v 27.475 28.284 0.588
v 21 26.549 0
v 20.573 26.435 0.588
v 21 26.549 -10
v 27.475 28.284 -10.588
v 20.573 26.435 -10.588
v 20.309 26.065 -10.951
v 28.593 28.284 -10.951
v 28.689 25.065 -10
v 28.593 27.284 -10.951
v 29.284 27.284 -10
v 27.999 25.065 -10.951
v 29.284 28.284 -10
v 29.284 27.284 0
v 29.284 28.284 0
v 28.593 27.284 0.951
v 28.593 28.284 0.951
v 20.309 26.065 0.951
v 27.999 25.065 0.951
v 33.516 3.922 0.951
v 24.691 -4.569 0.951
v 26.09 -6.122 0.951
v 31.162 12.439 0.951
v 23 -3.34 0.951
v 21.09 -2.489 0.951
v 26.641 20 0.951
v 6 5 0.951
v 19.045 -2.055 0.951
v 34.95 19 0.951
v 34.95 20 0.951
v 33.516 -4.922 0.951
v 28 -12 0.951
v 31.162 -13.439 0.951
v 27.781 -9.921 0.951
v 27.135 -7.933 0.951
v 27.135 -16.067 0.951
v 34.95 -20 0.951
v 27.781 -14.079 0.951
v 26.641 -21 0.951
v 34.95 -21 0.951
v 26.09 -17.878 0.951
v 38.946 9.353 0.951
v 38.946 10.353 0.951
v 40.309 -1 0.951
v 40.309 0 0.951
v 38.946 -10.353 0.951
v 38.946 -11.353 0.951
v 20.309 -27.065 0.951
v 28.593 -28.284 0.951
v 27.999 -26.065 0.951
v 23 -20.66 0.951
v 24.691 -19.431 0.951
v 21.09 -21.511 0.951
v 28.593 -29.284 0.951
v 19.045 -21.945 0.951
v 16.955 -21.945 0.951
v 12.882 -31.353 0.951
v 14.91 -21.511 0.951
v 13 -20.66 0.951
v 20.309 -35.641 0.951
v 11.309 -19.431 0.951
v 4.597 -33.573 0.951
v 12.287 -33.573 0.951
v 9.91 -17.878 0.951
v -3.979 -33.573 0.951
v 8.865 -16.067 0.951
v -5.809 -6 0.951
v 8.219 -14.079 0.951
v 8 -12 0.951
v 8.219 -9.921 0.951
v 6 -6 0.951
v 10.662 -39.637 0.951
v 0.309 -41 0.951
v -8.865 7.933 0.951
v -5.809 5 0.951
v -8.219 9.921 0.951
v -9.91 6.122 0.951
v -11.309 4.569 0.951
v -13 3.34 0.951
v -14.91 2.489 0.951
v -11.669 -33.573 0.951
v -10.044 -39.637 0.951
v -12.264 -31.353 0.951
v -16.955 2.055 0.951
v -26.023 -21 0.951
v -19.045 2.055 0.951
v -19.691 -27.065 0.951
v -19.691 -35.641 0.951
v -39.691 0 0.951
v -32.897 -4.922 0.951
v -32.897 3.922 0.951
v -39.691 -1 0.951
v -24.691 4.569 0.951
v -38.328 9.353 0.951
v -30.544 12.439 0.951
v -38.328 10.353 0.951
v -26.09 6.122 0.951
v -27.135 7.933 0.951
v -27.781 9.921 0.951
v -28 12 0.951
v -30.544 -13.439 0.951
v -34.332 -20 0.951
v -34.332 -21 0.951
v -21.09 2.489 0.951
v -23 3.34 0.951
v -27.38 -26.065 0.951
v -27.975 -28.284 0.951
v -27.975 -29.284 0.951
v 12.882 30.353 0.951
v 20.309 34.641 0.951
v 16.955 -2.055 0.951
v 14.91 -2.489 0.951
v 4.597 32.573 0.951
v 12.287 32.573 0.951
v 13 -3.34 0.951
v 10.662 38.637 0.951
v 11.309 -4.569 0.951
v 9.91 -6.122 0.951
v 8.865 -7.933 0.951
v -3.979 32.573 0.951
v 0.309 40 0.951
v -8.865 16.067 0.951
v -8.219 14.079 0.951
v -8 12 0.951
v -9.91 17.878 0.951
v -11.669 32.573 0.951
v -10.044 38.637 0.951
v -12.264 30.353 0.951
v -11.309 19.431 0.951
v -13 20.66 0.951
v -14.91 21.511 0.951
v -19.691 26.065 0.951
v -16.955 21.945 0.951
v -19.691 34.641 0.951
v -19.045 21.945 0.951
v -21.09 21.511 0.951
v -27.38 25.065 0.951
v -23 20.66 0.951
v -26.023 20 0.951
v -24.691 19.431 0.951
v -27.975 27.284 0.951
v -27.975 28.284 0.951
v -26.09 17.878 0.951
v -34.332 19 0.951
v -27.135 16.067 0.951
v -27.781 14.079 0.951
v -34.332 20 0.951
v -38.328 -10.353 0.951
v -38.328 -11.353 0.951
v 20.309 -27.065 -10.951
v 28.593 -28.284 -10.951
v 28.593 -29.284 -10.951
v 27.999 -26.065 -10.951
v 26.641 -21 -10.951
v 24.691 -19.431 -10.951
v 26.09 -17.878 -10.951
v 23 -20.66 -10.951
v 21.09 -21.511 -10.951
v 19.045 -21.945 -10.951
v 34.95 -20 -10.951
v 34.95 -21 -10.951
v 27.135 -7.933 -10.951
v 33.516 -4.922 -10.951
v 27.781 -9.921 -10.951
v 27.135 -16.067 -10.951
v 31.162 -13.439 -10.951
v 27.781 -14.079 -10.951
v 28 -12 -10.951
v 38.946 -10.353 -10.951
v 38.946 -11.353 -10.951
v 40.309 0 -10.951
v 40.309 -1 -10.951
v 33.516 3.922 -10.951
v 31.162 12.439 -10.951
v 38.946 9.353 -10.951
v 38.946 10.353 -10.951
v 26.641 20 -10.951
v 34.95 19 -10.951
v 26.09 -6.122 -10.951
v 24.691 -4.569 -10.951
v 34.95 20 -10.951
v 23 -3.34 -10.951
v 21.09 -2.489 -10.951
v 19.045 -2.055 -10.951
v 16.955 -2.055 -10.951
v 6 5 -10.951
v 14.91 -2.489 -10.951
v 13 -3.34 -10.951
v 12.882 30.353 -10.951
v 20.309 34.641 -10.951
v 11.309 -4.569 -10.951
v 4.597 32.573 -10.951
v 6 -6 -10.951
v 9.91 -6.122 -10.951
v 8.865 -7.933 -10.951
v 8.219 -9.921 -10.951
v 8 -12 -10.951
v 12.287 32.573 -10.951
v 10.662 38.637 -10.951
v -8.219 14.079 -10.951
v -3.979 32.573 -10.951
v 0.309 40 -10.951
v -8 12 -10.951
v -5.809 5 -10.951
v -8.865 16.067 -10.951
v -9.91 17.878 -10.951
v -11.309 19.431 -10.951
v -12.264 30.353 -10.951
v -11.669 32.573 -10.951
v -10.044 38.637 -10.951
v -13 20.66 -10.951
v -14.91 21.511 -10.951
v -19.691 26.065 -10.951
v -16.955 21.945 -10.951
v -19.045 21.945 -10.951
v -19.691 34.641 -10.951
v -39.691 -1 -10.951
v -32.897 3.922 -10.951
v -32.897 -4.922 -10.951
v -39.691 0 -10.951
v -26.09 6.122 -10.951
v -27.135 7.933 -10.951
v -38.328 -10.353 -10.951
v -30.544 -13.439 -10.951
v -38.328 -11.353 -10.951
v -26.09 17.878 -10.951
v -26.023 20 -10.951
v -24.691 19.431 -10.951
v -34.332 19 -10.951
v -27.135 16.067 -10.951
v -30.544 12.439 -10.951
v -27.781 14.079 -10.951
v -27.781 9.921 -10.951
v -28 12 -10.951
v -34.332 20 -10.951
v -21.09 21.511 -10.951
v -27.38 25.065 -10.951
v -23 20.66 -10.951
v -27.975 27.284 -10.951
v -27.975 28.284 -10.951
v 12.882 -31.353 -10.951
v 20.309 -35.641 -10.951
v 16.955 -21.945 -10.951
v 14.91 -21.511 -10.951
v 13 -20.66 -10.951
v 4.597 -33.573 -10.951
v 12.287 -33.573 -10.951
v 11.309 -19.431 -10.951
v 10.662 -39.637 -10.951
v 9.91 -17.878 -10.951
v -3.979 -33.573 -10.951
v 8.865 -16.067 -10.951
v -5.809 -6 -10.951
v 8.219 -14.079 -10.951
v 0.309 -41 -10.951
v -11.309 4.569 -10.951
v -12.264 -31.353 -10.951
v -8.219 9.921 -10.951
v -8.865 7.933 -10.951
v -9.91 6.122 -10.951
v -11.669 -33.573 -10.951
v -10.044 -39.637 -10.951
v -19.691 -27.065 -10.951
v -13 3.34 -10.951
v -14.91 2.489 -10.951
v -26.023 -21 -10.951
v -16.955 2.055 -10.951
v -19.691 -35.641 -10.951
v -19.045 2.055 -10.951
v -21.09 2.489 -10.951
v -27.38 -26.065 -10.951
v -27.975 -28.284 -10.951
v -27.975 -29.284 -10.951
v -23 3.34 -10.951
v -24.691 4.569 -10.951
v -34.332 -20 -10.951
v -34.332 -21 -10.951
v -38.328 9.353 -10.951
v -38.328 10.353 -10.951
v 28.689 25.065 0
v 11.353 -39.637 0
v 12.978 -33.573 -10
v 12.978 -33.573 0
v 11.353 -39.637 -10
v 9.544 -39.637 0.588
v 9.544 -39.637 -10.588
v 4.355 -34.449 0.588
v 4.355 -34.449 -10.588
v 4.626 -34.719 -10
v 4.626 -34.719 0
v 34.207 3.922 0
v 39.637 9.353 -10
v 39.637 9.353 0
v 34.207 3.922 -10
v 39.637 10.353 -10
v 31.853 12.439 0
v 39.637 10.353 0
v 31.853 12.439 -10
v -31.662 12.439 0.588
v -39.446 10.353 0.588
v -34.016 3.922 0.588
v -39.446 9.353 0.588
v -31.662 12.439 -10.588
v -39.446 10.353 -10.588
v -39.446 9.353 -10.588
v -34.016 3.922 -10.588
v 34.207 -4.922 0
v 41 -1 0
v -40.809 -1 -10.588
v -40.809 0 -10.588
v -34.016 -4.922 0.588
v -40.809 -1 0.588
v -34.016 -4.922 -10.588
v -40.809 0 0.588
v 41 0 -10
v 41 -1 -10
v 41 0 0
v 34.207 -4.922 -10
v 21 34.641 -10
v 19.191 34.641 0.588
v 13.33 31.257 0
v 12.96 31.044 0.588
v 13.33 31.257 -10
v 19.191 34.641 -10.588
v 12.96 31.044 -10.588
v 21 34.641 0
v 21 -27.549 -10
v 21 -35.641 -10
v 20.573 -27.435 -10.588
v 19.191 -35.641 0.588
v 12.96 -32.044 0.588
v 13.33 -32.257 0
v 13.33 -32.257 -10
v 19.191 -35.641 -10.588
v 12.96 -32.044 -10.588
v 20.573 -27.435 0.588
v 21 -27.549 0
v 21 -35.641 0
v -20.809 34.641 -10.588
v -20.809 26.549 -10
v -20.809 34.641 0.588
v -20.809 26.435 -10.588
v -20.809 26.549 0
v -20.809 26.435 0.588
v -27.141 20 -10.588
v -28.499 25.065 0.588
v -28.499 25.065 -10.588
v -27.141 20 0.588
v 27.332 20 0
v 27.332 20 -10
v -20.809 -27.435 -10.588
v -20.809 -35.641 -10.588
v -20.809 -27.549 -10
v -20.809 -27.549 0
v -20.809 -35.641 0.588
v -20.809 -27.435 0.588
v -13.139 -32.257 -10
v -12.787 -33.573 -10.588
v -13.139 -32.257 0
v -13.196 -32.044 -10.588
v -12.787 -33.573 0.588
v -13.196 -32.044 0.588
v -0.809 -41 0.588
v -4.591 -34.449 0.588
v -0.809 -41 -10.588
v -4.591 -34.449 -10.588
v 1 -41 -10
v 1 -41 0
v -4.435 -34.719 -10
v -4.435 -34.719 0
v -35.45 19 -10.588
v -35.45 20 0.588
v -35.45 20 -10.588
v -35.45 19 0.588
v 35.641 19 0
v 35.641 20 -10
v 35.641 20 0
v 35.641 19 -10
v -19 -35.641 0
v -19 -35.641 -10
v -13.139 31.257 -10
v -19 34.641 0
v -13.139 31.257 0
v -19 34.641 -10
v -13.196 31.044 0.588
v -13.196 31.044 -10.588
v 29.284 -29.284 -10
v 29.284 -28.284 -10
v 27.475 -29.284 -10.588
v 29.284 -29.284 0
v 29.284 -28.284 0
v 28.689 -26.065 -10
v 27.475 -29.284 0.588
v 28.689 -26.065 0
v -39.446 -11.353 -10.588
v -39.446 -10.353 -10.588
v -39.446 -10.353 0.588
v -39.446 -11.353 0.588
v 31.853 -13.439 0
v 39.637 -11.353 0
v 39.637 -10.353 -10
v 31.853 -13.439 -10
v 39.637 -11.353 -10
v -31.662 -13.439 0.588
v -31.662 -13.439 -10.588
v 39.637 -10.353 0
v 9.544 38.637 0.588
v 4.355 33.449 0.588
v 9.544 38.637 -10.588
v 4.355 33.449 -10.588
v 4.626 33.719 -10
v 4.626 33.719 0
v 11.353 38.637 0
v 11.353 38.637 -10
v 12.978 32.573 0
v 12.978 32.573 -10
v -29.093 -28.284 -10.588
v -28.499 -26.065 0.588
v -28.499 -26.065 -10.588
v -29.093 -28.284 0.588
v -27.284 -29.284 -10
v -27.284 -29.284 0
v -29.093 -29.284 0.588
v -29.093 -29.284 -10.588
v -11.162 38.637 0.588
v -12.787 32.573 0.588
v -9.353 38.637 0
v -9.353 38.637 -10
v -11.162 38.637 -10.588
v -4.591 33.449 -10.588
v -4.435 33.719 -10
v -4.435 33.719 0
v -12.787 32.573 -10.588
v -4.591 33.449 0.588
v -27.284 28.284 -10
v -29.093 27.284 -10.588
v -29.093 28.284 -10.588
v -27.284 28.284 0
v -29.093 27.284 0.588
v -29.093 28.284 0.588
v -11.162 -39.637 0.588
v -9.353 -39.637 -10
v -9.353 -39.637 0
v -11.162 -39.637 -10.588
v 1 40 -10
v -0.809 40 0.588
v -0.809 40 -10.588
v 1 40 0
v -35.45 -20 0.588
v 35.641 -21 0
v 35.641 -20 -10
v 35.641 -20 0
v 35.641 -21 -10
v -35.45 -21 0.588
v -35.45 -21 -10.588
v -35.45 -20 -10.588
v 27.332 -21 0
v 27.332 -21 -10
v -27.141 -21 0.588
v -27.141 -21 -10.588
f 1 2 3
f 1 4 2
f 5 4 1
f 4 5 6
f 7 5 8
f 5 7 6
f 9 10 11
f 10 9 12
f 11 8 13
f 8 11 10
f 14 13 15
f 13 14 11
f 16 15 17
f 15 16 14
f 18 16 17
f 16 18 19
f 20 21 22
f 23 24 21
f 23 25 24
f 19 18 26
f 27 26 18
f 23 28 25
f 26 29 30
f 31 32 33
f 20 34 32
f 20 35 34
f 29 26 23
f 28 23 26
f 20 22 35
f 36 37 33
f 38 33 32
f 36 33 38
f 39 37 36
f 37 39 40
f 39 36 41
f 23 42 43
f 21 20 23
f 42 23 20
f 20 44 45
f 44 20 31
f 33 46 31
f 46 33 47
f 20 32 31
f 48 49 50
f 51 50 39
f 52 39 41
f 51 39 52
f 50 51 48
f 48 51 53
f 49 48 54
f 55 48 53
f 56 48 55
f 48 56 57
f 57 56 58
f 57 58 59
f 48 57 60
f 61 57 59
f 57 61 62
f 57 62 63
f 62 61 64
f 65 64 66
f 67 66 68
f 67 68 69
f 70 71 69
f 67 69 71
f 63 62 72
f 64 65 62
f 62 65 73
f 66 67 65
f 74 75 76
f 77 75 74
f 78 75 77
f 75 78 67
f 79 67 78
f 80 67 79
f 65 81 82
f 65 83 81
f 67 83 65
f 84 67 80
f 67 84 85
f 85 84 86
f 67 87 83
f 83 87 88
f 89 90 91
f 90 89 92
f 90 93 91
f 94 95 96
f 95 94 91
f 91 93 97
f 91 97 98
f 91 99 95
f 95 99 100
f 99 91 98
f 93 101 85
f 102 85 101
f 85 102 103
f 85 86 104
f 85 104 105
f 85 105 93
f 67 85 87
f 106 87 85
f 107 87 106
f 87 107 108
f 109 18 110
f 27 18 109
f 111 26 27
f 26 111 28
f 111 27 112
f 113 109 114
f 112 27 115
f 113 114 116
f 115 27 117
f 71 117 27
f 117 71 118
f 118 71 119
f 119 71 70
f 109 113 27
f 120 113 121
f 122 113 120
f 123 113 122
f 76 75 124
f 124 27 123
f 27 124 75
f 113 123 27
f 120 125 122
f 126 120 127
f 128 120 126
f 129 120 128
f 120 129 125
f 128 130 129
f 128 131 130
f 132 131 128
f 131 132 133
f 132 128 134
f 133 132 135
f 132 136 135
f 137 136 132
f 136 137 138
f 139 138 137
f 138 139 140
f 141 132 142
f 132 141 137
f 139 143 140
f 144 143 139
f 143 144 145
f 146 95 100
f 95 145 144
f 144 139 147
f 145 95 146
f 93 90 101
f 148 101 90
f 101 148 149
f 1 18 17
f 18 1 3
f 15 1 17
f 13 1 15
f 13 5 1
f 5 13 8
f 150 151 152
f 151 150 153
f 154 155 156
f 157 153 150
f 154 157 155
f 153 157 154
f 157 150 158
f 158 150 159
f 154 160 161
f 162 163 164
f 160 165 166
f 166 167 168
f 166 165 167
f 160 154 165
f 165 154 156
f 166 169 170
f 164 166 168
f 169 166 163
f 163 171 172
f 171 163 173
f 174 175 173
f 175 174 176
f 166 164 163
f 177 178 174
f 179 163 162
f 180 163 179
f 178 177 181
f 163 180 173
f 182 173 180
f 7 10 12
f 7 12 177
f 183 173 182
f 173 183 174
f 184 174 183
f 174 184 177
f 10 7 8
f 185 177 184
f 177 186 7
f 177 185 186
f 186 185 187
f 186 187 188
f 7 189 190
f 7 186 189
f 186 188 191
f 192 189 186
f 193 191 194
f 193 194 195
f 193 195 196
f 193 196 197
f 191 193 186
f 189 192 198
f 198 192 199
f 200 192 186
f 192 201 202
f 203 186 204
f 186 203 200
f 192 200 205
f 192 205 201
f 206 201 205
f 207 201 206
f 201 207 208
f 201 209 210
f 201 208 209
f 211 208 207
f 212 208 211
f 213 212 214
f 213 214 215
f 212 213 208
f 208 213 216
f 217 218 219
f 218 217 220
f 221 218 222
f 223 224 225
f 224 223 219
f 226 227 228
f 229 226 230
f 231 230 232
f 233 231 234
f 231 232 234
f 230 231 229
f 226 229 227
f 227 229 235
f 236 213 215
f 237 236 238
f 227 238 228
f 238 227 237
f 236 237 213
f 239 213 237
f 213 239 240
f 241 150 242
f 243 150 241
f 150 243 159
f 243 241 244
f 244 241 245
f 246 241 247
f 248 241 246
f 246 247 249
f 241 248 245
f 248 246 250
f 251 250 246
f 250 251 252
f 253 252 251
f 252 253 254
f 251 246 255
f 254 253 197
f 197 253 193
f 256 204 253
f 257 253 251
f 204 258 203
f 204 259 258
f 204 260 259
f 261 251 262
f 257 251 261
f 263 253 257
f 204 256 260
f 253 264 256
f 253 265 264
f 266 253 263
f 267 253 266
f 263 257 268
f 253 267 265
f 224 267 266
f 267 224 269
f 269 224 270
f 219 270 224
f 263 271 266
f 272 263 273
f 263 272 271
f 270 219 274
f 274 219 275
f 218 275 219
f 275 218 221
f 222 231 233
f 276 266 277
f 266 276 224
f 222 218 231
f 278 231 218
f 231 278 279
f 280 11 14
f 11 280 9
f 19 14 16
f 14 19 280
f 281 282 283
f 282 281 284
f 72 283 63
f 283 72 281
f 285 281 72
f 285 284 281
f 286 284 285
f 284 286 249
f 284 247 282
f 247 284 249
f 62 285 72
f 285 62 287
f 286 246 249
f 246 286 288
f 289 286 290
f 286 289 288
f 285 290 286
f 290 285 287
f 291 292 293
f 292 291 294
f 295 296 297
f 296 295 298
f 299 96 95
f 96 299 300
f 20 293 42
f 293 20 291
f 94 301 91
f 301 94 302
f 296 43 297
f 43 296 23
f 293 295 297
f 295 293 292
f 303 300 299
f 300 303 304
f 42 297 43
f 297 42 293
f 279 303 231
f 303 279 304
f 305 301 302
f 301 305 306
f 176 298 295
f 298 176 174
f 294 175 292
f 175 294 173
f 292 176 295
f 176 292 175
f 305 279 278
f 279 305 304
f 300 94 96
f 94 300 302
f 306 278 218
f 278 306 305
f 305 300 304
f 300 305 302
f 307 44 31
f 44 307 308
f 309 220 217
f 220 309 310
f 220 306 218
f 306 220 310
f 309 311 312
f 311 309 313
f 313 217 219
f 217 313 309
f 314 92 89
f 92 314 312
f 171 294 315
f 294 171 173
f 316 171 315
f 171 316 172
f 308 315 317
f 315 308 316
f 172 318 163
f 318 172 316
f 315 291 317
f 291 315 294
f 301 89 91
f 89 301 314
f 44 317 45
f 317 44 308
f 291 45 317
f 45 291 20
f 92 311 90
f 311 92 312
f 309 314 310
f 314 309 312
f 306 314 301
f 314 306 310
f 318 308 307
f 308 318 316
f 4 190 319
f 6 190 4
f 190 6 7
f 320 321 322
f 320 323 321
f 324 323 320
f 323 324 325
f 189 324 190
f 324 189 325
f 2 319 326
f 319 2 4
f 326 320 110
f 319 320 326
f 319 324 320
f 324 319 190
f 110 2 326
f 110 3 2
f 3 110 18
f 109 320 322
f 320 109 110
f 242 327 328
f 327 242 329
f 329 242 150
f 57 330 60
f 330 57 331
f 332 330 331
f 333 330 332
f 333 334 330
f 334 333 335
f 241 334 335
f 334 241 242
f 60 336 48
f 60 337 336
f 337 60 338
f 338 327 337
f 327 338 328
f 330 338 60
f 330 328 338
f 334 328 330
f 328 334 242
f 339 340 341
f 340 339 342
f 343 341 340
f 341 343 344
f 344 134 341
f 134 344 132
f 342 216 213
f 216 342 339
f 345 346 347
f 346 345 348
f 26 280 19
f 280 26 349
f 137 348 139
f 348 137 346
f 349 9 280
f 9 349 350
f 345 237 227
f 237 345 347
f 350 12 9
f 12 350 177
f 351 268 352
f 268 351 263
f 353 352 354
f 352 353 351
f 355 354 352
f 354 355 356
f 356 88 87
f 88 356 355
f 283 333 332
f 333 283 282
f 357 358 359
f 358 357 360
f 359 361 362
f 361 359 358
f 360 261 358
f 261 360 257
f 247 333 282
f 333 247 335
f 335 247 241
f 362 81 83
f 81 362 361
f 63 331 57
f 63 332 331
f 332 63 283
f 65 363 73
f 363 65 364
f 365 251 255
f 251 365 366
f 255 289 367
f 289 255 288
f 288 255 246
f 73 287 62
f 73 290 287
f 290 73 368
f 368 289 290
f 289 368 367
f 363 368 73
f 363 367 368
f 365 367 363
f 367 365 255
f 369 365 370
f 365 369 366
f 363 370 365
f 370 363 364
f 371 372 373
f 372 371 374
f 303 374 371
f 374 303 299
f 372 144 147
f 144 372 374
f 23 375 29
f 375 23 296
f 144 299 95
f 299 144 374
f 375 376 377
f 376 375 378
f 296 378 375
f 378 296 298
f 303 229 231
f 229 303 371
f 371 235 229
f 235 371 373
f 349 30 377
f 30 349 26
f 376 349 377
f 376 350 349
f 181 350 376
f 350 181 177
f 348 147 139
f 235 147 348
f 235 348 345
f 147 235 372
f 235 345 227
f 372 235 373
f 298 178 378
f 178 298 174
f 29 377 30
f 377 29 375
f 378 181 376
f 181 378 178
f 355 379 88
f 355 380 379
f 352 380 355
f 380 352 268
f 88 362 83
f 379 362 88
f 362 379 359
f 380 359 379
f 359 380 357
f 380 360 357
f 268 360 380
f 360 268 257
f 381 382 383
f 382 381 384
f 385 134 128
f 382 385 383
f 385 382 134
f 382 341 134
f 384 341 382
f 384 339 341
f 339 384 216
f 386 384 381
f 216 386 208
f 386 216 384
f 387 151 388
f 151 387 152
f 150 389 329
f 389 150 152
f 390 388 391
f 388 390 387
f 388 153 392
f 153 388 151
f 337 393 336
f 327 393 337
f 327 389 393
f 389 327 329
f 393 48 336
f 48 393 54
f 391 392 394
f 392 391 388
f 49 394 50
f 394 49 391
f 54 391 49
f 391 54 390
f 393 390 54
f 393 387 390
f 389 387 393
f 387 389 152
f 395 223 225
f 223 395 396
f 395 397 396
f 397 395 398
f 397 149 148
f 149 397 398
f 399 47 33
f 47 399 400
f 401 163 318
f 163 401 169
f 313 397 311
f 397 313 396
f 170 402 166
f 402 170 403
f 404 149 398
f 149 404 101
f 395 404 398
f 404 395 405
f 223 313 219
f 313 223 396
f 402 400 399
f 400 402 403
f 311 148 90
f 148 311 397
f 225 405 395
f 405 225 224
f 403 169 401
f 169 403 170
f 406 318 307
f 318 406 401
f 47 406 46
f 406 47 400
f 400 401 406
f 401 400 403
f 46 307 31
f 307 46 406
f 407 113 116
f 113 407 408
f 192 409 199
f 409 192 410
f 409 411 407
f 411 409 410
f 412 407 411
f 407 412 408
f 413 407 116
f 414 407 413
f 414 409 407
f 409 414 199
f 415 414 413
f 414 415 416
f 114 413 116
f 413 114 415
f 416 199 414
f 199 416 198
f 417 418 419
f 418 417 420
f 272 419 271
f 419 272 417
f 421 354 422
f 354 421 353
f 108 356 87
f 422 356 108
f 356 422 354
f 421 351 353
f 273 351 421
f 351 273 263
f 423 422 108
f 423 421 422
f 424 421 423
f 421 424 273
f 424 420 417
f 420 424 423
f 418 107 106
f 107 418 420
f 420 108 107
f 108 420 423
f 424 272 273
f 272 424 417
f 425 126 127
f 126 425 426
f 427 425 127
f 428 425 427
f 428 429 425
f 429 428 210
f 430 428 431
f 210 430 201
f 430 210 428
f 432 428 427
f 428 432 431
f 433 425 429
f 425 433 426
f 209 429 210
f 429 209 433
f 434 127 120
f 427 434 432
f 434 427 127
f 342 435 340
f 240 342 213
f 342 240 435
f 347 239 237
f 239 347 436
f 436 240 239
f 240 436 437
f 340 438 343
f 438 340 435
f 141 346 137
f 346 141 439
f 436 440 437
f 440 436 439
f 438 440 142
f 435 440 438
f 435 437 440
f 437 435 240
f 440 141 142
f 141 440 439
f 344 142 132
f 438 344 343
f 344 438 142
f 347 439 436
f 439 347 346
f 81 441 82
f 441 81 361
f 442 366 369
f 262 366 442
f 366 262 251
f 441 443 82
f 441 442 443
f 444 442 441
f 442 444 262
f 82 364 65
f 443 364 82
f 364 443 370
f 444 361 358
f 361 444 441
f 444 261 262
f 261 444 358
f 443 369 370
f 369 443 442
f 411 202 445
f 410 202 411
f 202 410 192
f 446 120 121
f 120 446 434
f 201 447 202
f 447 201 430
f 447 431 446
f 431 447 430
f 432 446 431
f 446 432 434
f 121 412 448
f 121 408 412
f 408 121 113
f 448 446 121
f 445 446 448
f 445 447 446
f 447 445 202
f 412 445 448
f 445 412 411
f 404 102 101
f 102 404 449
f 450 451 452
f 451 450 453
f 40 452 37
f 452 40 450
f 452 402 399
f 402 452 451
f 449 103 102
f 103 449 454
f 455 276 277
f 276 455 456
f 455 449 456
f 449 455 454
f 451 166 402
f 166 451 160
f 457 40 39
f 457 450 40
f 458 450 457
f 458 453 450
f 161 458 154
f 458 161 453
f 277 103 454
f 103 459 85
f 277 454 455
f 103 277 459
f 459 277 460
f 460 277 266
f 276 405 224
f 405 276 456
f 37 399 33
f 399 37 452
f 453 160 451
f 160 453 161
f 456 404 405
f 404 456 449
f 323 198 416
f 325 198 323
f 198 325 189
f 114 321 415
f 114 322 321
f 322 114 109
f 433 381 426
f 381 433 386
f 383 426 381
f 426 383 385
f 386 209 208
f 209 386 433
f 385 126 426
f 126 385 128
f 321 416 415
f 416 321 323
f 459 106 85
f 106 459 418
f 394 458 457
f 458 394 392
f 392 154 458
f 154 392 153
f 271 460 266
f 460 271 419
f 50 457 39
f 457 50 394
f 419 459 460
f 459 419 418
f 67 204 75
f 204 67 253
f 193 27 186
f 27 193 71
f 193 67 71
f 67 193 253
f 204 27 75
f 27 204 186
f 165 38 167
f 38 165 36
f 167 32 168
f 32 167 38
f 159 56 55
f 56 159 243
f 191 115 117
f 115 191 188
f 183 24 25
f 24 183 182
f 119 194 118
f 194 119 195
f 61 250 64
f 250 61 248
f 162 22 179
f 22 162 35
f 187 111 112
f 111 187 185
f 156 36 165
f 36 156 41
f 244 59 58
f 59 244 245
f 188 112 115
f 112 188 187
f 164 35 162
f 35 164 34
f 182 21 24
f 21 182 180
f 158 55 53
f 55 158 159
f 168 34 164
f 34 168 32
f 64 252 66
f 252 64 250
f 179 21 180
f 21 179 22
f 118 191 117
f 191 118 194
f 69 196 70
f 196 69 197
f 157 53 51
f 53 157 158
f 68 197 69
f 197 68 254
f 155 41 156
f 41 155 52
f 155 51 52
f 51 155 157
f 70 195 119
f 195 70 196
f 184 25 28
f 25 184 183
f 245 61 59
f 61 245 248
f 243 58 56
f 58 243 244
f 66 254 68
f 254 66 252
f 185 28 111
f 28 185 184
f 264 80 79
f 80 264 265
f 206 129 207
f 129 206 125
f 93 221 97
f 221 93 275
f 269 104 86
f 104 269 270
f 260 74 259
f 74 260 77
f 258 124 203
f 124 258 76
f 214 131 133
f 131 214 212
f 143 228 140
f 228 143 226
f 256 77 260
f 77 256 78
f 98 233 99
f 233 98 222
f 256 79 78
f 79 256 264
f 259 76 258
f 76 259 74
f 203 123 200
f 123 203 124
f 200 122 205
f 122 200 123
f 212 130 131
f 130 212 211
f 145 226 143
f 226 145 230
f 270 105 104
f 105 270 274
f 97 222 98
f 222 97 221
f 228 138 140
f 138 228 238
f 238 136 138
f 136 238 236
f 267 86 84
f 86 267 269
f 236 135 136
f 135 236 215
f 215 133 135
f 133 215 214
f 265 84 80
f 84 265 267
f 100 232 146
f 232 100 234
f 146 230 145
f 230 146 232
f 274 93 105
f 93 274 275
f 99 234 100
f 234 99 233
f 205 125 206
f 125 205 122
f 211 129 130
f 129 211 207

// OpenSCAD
// Geared wheel with teeth

rotate([90,0,0])

difference(){ 
union(){
minkowski(){
for(i = [0:45:365]){
//translate([30, 30, 10])
rotate([90,i,0])
cylinder(10,40,40,$fn=2);
}
cylinder(r=1,h=1);
}
}

minkowski(){
translate([-5, -20, -5])
cube([10, 100, 10]);
cylinder(r=1,h=1);
}

translate([18, 20, 12])
rotate([90,0,0])
cylinder(100, 10, 10);

translate([-18, 20, -12])
rotate([90,0,0])
cylinder(100, 10, 10);


}
